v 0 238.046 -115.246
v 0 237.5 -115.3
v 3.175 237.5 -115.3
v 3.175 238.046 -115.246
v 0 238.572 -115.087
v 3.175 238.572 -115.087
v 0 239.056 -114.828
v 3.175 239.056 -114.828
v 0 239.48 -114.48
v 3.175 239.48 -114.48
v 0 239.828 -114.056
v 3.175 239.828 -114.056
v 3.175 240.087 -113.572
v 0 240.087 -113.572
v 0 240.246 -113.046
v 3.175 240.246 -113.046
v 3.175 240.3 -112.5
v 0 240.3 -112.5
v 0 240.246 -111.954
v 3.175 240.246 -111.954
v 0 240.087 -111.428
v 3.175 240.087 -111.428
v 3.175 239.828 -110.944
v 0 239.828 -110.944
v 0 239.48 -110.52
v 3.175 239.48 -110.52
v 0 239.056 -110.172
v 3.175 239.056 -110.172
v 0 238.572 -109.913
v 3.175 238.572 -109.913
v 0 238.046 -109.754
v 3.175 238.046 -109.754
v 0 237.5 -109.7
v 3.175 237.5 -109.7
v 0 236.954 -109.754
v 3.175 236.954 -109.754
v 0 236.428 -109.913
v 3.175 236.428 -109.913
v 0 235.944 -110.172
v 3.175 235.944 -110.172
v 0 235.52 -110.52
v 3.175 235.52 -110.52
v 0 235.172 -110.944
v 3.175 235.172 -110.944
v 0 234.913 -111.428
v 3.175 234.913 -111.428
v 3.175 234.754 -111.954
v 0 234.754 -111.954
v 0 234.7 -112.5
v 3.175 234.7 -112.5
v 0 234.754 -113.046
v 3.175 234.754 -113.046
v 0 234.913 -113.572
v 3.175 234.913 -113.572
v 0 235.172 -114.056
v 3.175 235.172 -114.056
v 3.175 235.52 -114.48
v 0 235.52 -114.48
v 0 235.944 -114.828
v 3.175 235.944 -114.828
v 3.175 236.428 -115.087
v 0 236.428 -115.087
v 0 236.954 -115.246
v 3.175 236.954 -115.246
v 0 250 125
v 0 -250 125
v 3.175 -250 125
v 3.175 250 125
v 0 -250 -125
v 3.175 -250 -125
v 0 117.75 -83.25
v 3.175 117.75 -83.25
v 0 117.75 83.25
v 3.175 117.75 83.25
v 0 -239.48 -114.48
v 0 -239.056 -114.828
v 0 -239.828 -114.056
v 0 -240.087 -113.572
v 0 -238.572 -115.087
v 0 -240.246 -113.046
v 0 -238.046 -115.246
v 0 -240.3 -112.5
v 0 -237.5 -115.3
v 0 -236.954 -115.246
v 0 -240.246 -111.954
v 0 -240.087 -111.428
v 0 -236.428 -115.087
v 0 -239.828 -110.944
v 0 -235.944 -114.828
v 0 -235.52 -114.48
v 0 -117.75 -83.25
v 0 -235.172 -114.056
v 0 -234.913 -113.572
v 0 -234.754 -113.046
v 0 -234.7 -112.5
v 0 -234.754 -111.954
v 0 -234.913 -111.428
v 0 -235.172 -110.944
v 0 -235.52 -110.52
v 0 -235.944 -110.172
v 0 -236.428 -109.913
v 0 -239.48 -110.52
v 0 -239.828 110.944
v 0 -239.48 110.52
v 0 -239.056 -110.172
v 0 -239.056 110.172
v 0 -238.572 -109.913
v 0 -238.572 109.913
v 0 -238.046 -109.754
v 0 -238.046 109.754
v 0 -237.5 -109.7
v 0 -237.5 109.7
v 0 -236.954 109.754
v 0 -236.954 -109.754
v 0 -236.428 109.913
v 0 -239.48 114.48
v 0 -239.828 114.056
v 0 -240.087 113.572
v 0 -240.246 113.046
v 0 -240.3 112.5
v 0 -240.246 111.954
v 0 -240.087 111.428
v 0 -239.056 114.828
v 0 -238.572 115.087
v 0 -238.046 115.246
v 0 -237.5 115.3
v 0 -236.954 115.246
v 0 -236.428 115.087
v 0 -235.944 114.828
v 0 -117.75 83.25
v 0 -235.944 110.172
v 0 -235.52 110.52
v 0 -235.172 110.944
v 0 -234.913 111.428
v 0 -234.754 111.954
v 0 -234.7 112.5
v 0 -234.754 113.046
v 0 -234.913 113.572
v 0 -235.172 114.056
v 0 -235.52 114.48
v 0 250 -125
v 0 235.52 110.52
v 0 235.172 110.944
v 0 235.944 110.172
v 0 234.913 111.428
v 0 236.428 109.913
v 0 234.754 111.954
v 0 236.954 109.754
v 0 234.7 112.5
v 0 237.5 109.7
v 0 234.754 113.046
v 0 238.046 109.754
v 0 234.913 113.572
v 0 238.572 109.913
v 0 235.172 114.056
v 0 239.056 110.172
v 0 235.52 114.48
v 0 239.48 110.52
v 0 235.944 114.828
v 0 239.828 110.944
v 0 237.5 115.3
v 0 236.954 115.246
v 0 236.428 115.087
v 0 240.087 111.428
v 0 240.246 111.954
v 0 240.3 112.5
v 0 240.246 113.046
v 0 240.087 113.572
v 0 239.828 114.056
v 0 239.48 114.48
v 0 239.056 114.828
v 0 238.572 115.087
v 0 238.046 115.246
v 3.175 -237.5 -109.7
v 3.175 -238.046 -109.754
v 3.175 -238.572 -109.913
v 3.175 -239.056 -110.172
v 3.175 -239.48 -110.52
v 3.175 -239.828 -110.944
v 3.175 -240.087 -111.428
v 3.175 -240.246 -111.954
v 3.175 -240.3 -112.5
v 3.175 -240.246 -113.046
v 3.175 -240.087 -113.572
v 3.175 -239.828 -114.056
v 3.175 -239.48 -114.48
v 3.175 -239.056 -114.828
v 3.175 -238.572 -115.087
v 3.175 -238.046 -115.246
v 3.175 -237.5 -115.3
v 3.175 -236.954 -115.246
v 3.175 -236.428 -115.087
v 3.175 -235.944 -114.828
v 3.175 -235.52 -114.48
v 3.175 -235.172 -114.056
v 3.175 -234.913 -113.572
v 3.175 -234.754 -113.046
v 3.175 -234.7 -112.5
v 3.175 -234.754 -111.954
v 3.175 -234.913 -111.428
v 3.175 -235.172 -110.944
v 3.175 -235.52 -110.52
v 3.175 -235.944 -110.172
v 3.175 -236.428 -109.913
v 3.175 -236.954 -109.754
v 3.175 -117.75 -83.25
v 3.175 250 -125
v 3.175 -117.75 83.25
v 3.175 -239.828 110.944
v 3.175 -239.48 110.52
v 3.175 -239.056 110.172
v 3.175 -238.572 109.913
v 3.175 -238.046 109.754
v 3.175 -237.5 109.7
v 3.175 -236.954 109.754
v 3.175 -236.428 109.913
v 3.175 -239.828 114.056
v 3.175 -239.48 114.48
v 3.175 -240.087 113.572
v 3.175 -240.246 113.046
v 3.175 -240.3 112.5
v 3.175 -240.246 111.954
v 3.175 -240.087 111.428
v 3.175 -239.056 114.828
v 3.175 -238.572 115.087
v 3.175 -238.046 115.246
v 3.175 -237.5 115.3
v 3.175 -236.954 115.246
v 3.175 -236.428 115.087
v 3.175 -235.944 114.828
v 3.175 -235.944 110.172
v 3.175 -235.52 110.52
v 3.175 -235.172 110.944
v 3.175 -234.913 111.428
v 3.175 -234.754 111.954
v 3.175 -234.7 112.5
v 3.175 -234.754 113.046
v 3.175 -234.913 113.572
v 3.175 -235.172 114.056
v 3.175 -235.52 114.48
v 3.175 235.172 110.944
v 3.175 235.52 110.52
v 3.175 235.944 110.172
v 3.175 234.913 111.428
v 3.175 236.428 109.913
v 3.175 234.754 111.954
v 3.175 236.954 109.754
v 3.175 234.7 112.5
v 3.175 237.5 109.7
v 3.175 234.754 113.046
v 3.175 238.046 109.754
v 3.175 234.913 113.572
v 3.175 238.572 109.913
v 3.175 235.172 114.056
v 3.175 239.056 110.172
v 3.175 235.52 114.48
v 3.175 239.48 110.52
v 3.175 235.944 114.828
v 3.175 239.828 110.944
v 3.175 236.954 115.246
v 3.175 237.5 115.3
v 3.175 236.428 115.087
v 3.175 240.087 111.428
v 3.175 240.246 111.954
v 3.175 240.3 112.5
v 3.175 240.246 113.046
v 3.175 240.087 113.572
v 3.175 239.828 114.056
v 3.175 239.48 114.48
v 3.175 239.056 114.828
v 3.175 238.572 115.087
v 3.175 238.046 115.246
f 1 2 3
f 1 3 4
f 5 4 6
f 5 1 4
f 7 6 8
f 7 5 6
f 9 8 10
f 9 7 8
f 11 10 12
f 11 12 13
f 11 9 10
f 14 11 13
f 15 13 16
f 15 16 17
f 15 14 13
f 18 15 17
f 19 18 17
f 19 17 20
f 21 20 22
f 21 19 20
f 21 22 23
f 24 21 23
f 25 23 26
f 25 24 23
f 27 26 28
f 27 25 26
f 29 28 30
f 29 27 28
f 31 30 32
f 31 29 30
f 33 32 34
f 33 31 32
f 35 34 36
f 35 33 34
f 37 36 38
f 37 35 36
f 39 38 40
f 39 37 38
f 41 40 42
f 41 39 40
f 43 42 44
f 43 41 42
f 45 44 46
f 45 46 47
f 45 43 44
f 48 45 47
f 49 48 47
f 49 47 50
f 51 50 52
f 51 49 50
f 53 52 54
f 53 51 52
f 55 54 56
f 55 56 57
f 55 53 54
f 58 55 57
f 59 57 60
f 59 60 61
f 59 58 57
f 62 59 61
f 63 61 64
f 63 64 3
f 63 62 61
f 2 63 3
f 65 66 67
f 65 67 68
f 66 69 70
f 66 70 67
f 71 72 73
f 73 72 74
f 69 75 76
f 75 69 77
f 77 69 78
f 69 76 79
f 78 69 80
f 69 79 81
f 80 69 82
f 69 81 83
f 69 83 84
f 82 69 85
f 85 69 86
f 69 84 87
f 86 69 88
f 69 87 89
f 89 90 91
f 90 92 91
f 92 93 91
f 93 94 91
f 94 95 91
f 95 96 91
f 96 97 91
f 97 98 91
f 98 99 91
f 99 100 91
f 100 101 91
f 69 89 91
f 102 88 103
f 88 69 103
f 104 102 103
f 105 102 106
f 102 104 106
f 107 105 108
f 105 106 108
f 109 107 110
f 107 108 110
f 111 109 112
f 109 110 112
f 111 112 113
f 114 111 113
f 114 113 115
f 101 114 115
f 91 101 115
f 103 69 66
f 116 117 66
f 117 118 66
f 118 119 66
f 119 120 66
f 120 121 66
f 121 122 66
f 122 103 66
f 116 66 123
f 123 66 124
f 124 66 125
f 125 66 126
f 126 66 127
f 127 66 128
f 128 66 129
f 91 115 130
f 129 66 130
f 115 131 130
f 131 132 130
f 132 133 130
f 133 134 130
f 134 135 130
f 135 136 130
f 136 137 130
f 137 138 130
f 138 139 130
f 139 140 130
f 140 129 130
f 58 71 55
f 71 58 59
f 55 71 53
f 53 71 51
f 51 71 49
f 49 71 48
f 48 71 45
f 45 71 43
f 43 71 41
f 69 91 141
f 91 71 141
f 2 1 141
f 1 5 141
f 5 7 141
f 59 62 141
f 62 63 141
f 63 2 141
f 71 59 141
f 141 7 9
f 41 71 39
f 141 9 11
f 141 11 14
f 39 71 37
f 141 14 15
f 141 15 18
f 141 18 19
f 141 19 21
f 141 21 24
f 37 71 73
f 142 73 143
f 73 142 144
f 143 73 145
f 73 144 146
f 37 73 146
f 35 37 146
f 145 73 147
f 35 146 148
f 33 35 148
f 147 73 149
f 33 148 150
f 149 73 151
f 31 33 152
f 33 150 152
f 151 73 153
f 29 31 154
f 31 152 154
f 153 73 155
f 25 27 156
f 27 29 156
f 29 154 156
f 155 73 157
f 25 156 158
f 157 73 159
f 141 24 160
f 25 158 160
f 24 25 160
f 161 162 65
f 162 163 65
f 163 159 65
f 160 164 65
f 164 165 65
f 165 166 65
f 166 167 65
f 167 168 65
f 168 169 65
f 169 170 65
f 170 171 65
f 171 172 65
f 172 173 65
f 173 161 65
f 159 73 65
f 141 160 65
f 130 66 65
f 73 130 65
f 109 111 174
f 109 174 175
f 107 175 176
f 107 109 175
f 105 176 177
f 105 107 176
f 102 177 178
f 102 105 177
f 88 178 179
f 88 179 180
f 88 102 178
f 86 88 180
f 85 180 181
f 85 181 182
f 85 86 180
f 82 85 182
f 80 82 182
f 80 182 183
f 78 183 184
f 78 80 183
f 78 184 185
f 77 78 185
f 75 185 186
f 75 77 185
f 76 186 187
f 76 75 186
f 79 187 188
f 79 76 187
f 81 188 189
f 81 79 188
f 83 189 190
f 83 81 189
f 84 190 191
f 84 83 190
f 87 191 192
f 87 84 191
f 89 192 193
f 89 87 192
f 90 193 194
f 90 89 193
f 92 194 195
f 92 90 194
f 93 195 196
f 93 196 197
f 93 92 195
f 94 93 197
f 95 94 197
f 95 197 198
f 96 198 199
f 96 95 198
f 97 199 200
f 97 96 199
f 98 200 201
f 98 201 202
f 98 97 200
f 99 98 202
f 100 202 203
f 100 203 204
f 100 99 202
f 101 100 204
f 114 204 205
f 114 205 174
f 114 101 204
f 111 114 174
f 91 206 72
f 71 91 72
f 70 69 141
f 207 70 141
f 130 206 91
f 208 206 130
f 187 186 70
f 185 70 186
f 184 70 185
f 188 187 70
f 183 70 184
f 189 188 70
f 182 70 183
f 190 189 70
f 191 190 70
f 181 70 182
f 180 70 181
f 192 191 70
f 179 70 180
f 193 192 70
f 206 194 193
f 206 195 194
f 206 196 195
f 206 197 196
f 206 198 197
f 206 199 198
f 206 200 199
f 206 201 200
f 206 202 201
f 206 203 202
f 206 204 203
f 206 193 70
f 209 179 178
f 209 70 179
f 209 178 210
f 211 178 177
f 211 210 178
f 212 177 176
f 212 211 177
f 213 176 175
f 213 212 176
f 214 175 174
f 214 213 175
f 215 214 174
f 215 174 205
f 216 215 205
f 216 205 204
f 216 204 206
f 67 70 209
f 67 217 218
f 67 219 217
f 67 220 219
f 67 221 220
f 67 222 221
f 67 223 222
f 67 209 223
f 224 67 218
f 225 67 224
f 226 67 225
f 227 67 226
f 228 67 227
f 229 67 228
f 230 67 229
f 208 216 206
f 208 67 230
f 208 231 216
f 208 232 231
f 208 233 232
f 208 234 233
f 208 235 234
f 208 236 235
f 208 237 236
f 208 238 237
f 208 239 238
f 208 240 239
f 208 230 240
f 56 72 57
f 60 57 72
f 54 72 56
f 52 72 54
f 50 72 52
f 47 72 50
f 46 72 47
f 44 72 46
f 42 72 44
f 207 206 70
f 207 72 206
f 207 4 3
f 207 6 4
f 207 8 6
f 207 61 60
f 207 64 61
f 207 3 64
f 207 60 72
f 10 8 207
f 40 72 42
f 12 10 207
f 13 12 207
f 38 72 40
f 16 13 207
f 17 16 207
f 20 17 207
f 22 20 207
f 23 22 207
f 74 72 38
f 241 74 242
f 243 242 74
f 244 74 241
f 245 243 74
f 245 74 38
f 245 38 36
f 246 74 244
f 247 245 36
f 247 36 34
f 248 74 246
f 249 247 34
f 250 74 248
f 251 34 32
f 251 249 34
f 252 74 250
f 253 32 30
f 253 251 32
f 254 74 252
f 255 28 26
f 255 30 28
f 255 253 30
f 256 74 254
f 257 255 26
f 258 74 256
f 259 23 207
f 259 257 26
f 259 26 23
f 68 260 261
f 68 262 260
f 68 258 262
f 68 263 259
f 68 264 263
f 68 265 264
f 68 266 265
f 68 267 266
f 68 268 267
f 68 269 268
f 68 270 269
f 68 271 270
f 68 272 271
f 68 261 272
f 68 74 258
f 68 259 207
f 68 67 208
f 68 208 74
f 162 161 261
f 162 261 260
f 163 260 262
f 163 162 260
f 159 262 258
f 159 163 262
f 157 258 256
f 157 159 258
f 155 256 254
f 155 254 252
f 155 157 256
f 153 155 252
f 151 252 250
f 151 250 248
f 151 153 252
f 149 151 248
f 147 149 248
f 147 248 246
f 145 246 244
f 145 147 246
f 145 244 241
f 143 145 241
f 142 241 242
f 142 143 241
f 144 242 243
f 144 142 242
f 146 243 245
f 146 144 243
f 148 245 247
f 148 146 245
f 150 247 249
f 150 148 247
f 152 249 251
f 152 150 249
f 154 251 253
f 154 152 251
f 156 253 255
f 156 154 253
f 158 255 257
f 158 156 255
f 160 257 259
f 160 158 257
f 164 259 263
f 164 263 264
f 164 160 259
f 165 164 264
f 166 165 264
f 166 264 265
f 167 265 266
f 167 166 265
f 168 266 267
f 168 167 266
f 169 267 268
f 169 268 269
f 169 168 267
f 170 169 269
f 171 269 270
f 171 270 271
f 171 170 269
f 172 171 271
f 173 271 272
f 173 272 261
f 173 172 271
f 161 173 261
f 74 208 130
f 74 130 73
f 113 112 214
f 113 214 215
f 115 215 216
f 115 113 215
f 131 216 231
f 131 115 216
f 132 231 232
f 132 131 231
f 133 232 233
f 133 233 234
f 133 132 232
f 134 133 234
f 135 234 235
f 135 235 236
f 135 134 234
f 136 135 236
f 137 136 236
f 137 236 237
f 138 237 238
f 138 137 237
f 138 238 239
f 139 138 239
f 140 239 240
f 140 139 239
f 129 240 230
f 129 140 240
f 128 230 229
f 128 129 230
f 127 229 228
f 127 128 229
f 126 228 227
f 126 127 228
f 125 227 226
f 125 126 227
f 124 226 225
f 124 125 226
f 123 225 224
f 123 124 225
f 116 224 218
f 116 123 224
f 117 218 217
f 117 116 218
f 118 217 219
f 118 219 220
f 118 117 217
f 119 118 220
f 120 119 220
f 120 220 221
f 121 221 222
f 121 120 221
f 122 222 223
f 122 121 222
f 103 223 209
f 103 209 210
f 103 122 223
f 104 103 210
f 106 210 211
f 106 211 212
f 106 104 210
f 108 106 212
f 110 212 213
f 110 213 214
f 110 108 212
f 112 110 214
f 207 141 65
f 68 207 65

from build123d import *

# Parameters (mm, degrees)
SKETCH1_W           = 500
SKETCH1_H           = 250
SKETCH1_R           = 2.8
BOSS_EXTRUDE1_DEPTH = 3.175
SKETCH2_W           = 235.5
SKETCH2_H           = 166.5
CUT_EXTRUDE1_DEPTH  = 280.526529376


with BuildPart() as part:
    # Sketch1 → Boss-Extrude1 (new body)
    with BuildSketch(Plane.YZ):
        Rectangle(SKETCH1_W, SKETCH1_H)
        with Locations(Location((-237.5, 112.5, 0), (0, 0, 270))):
            Circle(SKETCH1_R, mode=Mode.SUBTRACT)
        with Locations(Location((237.5, 112.5, 0), (0, 0, 90))):
            Circle(SKETCH1_R, mode=Mode.SUBTRACT)
        with Locations(Location((237.5, -112.5, 0), (0, 0, 270))):
            Circle(SKETCH1_R, mode=Mode.SUBTRACT)
        with Locations(Location((-237.5, -112.5, 0), (0, 0, 90))):
            Circle(SKETCH1_R, mode=Mode.SUBTRACT)
    extrude(amount=BOSS_EXTRUDE1_DEPTH)

    # Sketch2 → Cut-Extrude1 (cut, through all)
    with BuildSketch(Plane.YZ.offset(3.175)):
        Rectangle(SKETCH2_W, SKETCH2_H)
    extrude(amount=-CUT_EXTRUDE1_DEPTH, mode=Mode.SUBTRACT)


solid = part.part
